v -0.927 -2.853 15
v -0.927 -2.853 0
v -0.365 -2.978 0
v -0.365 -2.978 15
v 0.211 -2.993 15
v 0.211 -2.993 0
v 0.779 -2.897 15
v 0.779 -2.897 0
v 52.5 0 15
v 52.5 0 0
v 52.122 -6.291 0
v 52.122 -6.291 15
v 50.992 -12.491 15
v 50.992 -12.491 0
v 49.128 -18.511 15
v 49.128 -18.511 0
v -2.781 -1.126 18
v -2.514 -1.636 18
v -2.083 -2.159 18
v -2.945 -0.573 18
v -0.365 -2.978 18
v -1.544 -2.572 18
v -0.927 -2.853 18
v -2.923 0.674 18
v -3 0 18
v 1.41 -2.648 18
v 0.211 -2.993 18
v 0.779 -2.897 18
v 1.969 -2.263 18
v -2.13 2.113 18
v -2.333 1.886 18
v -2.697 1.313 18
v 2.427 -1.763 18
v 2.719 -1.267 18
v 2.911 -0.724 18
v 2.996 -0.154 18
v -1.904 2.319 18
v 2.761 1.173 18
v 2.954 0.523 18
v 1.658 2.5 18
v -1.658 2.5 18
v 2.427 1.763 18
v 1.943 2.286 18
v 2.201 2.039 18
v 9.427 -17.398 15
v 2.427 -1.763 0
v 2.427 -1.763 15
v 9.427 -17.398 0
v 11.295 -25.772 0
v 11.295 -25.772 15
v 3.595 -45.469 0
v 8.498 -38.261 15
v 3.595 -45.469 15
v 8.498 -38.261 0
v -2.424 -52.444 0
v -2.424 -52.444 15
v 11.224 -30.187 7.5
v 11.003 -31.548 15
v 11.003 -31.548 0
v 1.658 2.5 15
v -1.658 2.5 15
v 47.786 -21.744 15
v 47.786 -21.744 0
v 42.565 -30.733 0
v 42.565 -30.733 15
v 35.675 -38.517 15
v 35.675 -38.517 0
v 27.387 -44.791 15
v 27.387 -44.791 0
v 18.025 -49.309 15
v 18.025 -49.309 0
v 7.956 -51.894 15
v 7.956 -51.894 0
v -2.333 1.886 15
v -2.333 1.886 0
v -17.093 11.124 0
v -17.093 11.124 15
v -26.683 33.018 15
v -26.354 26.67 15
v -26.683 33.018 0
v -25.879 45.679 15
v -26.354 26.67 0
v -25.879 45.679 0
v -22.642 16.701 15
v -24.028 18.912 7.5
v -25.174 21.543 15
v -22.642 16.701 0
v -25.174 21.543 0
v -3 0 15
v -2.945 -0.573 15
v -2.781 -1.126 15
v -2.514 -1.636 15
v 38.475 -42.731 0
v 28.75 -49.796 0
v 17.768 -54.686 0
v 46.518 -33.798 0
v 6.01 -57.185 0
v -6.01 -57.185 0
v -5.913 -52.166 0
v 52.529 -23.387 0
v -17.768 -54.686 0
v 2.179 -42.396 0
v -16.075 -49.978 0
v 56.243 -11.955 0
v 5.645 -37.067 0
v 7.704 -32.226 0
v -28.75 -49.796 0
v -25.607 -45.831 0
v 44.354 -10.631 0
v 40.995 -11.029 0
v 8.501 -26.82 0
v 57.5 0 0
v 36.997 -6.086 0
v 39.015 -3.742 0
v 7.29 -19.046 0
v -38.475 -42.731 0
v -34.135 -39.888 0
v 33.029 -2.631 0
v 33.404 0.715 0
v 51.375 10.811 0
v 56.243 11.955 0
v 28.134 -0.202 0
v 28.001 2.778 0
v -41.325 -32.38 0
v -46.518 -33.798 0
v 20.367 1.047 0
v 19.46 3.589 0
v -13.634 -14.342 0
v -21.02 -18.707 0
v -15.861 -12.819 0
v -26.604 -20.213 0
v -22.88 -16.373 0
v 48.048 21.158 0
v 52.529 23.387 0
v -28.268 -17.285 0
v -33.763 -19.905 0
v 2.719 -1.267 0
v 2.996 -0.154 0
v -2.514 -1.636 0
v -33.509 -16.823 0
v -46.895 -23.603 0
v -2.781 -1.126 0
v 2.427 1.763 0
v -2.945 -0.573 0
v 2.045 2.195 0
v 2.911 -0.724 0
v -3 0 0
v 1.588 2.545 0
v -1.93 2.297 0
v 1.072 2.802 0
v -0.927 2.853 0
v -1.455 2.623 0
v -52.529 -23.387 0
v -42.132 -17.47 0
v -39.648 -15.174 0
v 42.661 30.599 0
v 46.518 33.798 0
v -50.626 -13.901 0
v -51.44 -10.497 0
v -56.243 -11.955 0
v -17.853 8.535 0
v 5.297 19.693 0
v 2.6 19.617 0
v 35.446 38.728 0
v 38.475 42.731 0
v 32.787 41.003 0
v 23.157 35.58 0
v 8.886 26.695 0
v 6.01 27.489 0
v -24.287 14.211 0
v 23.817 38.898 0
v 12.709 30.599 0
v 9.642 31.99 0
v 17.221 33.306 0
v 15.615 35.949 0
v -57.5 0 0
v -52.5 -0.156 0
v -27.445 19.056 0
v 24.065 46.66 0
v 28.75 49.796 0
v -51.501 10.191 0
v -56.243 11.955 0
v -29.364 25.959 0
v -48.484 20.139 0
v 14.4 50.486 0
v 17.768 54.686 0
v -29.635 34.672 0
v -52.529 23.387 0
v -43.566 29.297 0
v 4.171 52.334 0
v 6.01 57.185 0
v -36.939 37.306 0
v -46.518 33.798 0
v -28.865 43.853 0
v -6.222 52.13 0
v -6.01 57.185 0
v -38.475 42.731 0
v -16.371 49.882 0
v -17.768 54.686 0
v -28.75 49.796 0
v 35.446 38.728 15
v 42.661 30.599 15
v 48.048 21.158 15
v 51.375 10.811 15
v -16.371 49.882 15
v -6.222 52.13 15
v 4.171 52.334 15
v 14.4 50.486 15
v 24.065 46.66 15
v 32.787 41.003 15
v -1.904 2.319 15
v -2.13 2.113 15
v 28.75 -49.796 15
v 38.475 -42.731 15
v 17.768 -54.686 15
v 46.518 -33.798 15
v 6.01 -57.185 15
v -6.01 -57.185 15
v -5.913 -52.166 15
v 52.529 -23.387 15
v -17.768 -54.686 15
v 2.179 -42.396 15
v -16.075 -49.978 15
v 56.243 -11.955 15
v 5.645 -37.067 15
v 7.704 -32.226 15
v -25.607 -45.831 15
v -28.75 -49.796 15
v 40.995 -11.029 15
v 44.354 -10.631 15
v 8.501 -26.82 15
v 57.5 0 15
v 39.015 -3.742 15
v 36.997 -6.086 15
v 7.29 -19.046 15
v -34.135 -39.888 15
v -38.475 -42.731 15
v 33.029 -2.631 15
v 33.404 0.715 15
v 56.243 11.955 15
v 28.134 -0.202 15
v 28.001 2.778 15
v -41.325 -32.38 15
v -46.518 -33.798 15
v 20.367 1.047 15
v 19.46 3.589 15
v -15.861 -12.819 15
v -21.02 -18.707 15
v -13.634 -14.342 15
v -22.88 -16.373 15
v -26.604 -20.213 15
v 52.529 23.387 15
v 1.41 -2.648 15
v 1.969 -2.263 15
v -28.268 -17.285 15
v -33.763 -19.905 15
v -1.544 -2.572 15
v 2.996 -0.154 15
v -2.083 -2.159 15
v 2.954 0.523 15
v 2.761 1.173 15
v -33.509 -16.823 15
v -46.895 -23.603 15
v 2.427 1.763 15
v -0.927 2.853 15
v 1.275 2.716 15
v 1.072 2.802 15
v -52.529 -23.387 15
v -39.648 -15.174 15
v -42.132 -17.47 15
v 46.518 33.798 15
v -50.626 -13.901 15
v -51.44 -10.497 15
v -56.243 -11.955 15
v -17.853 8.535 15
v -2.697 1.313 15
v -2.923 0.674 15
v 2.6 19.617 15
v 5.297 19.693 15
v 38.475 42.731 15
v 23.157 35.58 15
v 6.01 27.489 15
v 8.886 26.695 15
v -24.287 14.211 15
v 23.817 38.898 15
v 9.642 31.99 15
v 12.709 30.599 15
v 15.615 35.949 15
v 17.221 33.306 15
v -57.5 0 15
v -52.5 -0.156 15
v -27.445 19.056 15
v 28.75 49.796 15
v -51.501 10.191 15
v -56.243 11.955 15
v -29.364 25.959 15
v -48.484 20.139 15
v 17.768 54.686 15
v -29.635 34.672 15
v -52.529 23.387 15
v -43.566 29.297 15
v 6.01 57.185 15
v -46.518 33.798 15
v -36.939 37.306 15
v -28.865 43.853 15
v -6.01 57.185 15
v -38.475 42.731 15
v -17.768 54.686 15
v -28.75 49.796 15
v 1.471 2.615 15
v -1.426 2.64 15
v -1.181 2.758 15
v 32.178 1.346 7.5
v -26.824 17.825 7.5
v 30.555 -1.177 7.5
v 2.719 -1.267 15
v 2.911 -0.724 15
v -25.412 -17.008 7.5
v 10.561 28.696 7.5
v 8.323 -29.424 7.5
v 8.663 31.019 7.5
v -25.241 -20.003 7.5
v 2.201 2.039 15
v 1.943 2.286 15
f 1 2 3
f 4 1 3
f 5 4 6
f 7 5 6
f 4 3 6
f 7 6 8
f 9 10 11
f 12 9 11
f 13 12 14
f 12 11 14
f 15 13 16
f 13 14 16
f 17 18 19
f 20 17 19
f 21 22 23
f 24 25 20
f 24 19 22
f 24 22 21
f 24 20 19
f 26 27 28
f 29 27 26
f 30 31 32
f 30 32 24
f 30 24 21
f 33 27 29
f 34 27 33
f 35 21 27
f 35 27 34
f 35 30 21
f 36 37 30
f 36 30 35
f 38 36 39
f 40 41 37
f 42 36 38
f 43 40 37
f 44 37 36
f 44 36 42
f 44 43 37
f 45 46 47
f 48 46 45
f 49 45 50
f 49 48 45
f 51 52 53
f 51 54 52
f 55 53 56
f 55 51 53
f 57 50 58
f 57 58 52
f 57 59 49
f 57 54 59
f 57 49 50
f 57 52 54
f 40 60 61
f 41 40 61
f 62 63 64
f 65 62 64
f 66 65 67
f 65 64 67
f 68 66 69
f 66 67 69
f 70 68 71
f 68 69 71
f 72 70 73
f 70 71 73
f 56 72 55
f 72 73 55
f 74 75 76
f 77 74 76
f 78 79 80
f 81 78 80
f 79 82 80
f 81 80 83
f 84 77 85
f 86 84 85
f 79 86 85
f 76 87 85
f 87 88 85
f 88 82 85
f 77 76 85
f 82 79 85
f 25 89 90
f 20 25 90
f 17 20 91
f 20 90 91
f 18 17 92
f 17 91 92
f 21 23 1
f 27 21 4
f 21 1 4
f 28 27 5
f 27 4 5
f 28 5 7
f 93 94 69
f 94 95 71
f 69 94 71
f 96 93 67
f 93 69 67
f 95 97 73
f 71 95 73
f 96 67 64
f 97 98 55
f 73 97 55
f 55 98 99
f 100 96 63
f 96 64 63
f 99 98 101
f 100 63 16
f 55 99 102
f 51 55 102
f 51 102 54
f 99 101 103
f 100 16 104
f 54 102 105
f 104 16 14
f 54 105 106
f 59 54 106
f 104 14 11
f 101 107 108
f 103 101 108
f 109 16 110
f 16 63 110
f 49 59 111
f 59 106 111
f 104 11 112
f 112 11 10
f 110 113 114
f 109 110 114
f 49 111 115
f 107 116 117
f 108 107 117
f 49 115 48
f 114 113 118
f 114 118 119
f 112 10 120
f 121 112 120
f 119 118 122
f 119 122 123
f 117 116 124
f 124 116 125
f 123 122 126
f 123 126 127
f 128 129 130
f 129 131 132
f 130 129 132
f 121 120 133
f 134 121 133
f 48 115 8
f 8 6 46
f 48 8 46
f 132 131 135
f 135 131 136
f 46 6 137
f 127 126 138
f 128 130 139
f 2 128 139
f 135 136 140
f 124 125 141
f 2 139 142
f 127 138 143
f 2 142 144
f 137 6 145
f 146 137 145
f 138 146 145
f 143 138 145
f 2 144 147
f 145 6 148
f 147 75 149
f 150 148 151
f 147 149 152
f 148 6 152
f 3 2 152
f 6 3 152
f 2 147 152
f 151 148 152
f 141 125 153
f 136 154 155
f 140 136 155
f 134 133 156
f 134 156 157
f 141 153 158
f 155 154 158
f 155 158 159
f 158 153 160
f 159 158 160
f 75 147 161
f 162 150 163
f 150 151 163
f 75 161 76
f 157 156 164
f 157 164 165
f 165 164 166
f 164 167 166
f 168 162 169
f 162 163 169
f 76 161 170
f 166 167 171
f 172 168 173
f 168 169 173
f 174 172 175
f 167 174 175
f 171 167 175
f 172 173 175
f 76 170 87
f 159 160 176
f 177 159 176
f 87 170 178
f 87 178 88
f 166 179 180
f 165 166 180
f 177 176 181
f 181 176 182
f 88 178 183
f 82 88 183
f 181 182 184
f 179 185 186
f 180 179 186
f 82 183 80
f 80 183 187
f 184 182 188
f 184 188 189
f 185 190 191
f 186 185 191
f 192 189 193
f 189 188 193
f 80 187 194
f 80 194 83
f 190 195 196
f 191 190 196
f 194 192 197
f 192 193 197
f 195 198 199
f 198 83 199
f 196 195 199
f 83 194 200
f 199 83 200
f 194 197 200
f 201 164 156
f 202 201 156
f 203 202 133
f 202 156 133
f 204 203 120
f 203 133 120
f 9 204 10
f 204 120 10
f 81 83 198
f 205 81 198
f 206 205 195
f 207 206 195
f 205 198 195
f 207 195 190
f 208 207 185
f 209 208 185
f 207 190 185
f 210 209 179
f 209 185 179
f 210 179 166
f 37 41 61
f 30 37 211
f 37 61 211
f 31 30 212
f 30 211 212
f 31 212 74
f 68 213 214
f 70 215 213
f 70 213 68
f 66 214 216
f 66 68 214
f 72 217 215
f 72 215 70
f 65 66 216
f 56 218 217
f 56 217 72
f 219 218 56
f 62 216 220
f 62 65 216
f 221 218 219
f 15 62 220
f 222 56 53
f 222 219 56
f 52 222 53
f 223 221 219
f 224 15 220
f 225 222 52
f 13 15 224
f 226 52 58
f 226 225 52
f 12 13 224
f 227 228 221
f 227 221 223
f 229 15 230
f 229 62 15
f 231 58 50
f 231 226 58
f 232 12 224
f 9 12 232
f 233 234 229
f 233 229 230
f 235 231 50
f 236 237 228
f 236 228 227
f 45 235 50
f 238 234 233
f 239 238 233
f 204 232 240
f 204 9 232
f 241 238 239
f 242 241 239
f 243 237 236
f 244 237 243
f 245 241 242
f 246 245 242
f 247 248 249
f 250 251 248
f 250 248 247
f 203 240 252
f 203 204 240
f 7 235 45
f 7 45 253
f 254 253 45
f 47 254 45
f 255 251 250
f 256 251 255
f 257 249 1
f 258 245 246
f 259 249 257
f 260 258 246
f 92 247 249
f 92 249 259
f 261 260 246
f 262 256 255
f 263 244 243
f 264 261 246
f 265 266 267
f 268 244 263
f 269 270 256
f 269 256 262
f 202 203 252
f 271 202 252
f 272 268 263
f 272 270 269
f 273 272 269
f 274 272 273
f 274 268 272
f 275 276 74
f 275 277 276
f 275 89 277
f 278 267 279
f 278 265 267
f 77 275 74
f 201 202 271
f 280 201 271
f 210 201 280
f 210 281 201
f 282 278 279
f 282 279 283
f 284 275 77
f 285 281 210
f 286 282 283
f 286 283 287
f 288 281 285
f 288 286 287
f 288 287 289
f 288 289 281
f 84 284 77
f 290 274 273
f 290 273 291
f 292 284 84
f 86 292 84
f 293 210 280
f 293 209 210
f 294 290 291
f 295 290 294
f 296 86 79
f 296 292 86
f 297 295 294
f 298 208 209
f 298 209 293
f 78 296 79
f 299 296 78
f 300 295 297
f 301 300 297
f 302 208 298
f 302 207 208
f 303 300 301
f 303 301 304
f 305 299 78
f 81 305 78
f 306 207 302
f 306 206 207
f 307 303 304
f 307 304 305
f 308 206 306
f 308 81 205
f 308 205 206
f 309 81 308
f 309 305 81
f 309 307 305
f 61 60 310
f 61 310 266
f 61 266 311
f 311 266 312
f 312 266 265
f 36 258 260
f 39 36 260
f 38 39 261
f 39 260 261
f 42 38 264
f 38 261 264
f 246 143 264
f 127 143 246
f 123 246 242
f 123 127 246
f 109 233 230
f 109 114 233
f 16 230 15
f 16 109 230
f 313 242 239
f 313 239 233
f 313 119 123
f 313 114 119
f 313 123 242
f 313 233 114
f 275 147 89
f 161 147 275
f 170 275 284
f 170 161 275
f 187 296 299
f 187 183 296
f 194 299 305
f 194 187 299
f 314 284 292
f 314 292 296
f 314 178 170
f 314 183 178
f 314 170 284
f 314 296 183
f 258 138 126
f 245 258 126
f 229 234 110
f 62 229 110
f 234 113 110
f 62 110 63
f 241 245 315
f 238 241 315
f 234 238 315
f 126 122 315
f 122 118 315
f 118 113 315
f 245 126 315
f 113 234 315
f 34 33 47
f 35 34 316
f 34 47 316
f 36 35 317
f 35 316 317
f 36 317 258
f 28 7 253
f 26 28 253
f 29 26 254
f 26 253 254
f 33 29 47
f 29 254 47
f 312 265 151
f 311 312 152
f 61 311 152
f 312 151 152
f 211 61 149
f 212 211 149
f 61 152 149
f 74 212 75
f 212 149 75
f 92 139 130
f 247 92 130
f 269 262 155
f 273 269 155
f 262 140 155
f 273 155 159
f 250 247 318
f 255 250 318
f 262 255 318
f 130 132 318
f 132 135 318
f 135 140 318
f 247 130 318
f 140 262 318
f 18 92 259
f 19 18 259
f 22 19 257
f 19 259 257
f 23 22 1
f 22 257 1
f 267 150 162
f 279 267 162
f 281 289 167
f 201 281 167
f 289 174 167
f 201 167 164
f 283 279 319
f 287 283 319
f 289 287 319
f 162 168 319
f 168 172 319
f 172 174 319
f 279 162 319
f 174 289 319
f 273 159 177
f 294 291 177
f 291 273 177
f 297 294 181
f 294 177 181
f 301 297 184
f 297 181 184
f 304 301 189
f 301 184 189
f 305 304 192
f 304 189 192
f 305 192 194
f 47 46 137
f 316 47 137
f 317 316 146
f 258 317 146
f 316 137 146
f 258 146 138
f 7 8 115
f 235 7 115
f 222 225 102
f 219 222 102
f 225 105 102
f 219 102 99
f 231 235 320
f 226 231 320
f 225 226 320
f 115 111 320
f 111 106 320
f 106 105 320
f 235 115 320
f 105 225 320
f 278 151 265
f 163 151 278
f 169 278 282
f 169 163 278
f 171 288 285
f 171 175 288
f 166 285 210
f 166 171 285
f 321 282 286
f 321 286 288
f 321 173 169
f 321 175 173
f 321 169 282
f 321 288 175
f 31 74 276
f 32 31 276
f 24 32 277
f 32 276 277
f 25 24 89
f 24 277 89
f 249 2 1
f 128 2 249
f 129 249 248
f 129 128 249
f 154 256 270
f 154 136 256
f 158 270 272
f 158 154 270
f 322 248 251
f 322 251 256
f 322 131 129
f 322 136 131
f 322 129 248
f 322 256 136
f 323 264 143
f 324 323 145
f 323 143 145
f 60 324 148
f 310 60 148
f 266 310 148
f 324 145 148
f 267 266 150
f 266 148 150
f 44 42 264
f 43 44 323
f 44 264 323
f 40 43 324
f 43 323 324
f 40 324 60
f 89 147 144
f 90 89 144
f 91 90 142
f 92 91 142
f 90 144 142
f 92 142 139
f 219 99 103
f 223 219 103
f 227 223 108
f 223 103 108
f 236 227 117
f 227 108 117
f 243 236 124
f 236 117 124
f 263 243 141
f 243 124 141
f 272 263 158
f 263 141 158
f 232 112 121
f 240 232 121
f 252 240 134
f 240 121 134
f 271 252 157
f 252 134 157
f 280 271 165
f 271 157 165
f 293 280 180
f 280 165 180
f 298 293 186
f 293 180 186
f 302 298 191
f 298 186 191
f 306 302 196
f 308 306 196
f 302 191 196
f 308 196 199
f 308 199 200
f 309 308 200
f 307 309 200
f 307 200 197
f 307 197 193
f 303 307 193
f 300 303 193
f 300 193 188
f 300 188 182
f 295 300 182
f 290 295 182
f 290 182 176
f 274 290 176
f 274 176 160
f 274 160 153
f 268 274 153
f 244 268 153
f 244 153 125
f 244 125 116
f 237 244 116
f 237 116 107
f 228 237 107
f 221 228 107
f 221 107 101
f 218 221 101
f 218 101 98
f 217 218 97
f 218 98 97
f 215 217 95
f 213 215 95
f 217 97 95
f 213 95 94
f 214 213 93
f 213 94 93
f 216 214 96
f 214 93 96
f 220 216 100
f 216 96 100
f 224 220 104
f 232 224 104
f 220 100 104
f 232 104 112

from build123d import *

# Parameters (mm, degrees)
F0_R     = 57.5
F1_DEPTH = 15
F2_DEPTH = 15
F4_COUNT = 5
F6_DEPTH = 3


with BuildPart() as f1:
    # F0 (on Top) → F1 (new body)
    with BuildSketch(Plane.XY):
        Circle(F0_R)
        with BuildLine():
            ThreePointArc((-25.8787150819, 45.6786832747), (26.4349906204, 45.3590263443), (52.5, 0))
            ThreePointArc((52.5, 0), (-24.9083328879, -46.2149862355), (-28.8647601045, 43.8528861548))
            ThreePointArc((-28.8647601045, 43.8528861548), (-27.386956798, 44.7906753393), (-25.8787150819, 45.6786832747))
        make_face(mode=Mode.SUBTRACT)
    extrude(amount=F1_DEPTH)



with BuildPart() as f1b:
    # F0 (on Top) → F1, piece 2 (new body)
    with BuildSketch(Plane.XY):
        with BuildLine():
            ThreePointArc((3, 0), (1, 2.8284271247), (-2.3333333333, 1.8856180832))
            ThreePointArc((-2.3333333333, 1.8856180832), (-2.8284271247, 1), (-3, 0))
            ThreePointArc((-3, 0), (0, -3), (3, 0))
        make_face()
    extrude(amount=F1_DEPTH)


with BuildPart() as f1_1:
    add(f1.part)

    add(f1b.part)  # F2 merges F1b
    # F0 (on Top) → F2 (join)
    with BuildSketch(Plane.XY):
        with BuildLine():
            add(Edge.make_bspline(
                [(-2.3333333333, 1.8856180832), (-10.9416758466, 6.9247769231), (-29.1664290337, 16.1295933501), (-26.623576941, 36.0633998347), (-25.8787150819, 45.6786832747)],
                knots=[0, 0, 0, 0, 0.5034367583, 1, 1, 1, 1], degree=3))
            ThreePointArc((-25.8787150819, 45.6786832747), (-27.386956798, 44.7906753393), (-28.8647601045, 43.8528861548))
            add(Edge.make_bspline(
                [(-3, 0), (-12.803393035, 5.0838333397), (-31.7879164967, 14.9257102522), (-29.8275065593, 34.4356080017), (-28.8647601045, 43.8528861548)],
                knots=[0, 0, 0, 0, 0.5163354868, 1, 1, 1, 1], degree=3))
            ThreePointArc((-3, 0), (-2.8284271247, 1), (-2.3333333333, 1.8856180832))
        make_face()
    extrude(amount=F2_DEPTH)

    # F4: F1 ×5 about axis
    f4_axis = Axis((0, 0, 5.5775735527), (0, 0, -1))


with BuildPart() as f1_2:
    add(f1_1.part)
    for i in range(1, F4_COUNT):
        add(f1_1.part.rotate(f4_axis, i * 360 / F4_COUNT))

    # F5 (on face) → F6 (join)
    with BuildSketch(Plane.XY.offset(15)):
        with BuildLine():
            Line((1.6583123952, 2.5), (-1.6583123952, 2.5))
            ThreePointArc((-1.6583123952, 2.5), (-2.0193254295, 2.2186312919), (-2.3333333333, 1.8856180832))
            ThreePointArc((-2.3333333333, 1.8856180832), (-2.8284271247, 1), (-3, 0))
            ThreePointArc((-3, 0), (-2.8760308636, -0.8534907567), (-2.5143690188, -1.6364438388))
            ThreePointArc((-2.5143690188, -1.6364438388), (-1.8250885652, -2.3809770535), (-0.9270509831, -2.8531695489))
            ThreePointArc((-0.9270509831, -2.8531695489), (-0.0770244674, -2.9990110422), (0.7793678195, -2.8969959962))
            ThreePointArc((0.7793678195, -2.8969959962), (1.700460359, -2.4715247455), (2.4270509831, -1.7633557569))
            ThreePointArc((2.4270509831, -1.7633557569), (2.8284271247, -1), (2.9960448209, -0.1539981522))
            ThreePointArc((2.9960448209, -0.1539981522), (2.8760308636, 0.8534907567), (2.4270509831, 1.7633557569))
            ThreePointArc((2.4270509831, 1.7633557569), (2.0756227182, 2.1660540925), (1.6583123952, 2.5))
        make_face()
    extrude(amount=F6_DEPTH)


solid = f1_2.part
